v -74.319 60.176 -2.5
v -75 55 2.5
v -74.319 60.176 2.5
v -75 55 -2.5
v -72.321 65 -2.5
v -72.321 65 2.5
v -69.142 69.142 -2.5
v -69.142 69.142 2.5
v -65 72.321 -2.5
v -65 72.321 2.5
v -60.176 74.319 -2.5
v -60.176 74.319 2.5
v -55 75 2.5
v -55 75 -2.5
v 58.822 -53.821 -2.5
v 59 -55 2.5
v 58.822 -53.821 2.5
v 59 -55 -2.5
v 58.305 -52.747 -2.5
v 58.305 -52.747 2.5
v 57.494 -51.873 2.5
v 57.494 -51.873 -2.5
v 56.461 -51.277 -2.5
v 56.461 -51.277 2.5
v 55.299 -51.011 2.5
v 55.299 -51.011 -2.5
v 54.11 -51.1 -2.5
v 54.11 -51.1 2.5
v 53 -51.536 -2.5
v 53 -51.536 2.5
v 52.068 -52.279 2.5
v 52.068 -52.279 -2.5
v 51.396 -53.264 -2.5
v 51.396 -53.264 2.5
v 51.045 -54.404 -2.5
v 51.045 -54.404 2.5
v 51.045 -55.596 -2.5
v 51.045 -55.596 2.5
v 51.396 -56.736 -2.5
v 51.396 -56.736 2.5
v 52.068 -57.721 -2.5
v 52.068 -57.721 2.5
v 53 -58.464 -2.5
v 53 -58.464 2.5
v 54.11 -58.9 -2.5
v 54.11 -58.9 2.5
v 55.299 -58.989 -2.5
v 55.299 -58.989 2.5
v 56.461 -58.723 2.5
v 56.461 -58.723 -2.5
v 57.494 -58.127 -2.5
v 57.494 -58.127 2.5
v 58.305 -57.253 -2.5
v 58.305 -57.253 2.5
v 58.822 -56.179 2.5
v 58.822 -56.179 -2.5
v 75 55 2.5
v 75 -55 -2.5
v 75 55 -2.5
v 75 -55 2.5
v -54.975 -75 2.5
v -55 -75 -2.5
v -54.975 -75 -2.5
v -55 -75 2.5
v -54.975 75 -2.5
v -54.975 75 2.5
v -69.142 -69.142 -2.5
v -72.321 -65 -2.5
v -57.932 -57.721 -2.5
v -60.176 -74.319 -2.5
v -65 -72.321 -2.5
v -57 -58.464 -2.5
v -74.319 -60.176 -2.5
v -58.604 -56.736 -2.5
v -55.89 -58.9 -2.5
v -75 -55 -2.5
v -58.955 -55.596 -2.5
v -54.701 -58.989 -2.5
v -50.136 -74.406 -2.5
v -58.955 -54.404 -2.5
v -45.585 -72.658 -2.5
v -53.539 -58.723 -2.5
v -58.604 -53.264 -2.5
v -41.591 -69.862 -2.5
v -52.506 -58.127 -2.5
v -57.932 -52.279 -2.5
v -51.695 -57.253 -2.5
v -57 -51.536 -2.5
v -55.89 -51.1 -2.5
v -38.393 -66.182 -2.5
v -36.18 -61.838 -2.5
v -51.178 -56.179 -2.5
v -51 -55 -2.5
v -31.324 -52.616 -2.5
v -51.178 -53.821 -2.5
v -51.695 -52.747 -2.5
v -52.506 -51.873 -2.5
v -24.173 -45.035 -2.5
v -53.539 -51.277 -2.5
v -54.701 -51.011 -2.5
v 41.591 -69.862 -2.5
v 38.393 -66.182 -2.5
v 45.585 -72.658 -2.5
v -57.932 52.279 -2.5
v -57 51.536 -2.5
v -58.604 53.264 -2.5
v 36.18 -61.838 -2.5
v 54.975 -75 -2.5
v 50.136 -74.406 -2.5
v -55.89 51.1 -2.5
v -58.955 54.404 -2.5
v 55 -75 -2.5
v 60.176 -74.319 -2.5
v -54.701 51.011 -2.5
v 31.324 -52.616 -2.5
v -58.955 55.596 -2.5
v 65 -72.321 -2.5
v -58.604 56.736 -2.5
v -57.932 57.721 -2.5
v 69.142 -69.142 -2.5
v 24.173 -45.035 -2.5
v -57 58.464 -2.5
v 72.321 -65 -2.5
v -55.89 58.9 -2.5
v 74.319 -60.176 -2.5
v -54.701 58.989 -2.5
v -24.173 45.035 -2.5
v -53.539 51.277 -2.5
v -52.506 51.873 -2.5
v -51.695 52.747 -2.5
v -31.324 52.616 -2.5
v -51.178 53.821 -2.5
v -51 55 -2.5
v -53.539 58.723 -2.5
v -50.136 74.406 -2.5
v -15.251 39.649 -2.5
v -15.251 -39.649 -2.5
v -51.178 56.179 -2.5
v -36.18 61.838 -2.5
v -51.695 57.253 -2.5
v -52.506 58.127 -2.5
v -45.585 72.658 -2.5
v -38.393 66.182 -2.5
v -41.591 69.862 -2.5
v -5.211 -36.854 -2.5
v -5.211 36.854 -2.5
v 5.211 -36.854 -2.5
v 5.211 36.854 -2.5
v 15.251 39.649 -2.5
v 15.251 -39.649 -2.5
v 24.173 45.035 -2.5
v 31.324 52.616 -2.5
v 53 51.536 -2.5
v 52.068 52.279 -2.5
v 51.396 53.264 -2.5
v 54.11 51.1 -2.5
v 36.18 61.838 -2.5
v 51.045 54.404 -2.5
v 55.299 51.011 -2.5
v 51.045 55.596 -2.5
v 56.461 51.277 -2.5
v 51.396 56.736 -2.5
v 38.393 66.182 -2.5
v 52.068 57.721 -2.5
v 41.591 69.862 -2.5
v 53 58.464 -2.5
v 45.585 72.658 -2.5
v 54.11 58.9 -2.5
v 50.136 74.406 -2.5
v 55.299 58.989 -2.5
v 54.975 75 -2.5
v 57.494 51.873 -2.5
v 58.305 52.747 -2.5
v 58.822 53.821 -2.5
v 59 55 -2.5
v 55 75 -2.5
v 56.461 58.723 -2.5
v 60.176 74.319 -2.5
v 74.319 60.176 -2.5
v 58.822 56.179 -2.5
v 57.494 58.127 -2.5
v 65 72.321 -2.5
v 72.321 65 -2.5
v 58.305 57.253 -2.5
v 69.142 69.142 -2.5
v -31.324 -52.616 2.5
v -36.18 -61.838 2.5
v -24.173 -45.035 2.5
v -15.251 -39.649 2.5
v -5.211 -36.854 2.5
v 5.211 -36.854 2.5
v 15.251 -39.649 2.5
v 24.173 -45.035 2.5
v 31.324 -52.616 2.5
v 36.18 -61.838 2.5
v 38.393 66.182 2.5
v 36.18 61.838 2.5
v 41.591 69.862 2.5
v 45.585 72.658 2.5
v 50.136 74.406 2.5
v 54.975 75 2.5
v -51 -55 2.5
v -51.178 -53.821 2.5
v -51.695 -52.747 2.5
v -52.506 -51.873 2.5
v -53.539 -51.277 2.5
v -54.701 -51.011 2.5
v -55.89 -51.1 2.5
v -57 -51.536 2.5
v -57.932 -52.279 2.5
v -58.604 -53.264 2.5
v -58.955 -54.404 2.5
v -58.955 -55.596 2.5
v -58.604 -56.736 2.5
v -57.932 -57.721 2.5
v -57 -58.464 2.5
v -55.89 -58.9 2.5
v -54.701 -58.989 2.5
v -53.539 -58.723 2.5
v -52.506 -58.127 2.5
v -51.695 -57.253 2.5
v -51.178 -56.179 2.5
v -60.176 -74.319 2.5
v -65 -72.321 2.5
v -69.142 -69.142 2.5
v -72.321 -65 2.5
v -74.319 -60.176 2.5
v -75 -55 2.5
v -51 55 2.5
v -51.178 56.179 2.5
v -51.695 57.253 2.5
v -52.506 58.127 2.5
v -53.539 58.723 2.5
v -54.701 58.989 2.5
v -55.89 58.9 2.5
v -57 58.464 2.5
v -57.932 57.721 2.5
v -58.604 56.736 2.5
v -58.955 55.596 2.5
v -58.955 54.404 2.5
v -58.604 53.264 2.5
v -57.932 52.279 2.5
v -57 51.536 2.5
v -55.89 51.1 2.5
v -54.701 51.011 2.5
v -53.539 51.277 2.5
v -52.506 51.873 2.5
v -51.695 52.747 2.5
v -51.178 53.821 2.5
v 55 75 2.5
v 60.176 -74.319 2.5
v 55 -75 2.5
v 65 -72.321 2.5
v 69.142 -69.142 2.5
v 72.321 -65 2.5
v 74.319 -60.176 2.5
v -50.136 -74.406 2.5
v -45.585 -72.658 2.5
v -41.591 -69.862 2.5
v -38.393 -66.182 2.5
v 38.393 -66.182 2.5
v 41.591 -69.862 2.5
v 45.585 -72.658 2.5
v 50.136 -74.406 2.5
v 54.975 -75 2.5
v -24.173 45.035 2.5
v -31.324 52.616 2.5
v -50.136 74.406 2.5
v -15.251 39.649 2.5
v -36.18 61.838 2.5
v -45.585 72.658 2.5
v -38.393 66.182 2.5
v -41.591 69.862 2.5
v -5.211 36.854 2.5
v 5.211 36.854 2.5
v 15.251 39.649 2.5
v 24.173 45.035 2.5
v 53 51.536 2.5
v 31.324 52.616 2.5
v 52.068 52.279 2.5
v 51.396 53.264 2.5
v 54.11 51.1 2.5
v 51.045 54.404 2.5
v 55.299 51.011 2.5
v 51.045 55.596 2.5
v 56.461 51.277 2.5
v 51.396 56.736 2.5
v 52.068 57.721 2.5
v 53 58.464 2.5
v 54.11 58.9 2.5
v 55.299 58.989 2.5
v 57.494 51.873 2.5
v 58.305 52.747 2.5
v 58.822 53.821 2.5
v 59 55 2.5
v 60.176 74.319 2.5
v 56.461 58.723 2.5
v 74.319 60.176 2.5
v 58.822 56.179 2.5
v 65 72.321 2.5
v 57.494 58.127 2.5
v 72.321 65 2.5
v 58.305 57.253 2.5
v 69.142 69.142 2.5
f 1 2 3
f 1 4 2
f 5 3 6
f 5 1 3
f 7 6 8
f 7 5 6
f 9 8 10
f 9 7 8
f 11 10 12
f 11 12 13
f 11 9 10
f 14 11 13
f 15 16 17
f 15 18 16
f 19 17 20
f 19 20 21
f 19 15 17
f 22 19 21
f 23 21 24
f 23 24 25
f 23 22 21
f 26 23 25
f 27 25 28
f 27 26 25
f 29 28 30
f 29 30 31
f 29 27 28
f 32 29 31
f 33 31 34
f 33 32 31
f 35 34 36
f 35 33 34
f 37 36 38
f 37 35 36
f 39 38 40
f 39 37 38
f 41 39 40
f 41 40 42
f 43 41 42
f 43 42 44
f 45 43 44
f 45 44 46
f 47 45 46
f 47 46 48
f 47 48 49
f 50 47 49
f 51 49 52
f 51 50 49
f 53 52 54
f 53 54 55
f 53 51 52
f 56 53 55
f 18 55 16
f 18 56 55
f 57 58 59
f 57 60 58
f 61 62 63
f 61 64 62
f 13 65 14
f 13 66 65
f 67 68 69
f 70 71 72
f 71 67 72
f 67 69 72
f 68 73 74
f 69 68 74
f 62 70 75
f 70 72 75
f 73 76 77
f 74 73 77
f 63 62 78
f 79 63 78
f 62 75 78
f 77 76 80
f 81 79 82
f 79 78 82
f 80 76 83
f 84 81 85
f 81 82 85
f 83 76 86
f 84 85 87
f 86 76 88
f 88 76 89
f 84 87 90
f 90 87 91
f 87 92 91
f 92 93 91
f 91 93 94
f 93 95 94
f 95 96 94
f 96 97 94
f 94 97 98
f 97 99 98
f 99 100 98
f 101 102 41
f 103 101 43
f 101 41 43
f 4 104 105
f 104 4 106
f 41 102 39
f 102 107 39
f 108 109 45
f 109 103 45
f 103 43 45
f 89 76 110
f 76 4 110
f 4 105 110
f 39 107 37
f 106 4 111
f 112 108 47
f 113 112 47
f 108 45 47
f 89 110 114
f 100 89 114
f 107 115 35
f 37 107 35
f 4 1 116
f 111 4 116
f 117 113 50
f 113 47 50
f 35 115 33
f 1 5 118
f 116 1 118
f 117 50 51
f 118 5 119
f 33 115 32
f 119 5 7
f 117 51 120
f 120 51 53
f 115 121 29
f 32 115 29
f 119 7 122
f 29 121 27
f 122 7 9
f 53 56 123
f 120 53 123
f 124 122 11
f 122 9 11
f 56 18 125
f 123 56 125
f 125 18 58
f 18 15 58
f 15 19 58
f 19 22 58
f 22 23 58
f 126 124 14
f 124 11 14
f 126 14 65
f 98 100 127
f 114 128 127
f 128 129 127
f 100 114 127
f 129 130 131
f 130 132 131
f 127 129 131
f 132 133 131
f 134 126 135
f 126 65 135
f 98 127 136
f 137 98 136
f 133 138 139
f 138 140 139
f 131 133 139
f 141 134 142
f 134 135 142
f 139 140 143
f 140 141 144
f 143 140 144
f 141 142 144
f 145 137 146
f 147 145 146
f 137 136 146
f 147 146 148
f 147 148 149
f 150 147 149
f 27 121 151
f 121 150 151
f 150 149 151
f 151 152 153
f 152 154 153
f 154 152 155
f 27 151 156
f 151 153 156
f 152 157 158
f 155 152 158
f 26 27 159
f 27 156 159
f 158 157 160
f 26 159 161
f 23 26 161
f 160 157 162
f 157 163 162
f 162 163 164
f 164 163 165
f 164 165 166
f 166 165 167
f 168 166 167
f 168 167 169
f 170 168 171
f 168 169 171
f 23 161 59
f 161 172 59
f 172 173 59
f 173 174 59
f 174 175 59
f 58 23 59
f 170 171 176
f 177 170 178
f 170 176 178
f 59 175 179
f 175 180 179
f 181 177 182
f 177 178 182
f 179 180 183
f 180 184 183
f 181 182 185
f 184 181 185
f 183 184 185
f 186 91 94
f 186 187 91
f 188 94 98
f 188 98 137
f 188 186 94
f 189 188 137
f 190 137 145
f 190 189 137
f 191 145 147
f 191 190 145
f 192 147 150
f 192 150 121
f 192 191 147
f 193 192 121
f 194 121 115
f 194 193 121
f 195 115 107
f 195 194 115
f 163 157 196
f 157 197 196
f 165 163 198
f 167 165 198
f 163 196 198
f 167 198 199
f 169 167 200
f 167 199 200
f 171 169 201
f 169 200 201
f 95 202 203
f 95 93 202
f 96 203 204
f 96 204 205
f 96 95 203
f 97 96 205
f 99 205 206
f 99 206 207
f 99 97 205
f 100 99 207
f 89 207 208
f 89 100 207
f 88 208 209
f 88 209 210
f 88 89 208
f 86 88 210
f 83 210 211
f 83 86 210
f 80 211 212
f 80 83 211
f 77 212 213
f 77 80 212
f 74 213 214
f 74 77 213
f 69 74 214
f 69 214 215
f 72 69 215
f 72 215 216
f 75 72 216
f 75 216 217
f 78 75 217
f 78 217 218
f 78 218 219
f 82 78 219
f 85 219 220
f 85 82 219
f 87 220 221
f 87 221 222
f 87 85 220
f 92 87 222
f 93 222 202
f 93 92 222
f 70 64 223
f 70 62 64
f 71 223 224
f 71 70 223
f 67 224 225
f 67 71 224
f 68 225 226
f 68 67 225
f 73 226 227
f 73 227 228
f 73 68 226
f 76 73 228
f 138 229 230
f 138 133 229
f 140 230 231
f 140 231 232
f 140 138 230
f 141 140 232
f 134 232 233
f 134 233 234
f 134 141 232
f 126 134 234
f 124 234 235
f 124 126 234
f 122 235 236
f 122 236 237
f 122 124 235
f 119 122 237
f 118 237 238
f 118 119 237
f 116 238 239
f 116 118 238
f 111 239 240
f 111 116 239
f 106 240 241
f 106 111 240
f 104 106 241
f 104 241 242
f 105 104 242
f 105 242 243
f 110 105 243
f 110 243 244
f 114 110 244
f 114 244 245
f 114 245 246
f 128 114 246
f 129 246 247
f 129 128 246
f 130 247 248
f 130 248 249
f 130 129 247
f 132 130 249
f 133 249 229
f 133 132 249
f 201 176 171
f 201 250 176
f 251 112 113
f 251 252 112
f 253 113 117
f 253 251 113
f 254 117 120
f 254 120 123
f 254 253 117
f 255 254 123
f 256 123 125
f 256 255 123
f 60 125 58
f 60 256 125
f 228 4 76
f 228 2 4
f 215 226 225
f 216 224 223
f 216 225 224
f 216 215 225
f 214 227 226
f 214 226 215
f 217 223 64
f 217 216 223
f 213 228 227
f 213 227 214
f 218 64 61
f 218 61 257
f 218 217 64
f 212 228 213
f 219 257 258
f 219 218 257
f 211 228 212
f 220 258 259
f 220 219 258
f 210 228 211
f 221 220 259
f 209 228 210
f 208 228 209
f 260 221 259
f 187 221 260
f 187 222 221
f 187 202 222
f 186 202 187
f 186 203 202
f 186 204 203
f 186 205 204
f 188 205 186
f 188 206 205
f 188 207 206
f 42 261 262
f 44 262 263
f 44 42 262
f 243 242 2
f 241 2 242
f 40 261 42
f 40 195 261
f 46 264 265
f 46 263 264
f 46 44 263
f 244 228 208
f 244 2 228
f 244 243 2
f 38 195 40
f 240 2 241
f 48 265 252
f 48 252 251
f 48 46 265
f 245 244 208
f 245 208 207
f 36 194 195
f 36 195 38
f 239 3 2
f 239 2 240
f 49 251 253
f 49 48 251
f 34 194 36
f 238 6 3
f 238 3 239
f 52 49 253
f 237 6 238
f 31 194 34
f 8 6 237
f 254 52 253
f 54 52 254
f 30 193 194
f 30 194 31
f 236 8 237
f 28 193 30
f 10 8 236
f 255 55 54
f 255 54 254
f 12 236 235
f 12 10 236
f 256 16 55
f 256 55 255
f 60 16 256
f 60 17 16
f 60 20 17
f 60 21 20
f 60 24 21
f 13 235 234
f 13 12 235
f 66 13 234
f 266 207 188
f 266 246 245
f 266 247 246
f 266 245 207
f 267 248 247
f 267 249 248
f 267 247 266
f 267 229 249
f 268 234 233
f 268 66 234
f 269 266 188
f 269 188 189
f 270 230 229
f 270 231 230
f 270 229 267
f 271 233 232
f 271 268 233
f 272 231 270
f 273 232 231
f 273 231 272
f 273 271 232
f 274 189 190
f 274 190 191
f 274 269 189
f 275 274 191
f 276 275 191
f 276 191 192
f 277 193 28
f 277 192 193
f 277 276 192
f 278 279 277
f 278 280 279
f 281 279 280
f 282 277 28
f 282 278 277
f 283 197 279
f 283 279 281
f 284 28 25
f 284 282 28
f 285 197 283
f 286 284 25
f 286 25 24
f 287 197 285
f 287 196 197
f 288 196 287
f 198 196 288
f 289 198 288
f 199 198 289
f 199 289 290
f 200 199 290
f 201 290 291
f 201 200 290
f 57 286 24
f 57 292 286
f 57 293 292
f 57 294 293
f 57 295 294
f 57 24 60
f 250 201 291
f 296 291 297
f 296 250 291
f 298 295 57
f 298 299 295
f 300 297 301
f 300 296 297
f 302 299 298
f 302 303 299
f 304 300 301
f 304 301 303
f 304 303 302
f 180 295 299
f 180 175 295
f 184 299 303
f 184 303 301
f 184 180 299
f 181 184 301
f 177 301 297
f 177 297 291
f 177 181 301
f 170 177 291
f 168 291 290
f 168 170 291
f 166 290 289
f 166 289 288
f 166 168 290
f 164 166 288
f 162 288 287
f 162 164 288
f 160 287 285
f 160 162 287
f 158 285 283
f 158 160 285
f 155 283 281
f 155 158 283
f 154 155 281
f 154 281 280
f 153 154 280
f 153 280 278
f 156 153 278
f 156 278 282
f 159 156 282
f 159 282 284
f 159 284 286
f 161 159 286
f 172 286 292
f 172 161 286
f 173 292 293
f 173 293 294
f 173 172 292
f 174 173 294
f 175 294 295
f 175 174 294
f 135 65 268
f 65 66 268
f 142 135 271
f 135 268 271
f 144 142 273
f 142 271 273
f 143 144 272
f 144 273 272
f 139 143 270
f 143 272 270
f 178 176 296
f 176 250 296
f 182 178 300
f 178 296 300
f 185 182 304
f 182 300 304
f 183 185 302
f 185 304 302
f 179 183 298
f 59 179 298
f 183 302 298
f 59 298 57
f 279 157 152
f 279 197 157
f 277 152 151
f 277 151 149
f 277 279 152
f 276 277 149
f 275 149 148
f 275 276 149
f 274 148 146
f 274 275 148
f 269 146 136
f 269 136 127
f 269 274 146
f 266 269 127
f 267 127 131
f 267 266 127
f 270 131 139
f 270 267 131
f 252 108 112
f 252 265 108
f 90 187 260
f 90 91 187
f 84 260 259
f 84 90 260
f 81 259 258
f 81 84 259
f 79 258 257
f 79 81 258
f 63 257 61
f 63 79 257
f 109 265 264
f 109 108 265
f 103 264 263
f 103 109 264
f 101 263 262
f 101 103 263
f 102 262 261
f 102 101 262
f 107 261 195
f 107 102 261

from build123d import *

# Parameters (mm, degrees)
F0_R     = 4
F1_DEPTH = 2.5
F2_R     = 20


with BuildPart() as f1:
    # F0 (on Top) → F1 (new body, symmetric)
    with BuildSketch(Plane.XY):
        with BuildLine():
            Line((38.5, -75), (75, -75))
            Line((75, -75), (75, 75))
            Line((75, 75), (38.5, 75))
            ThreePointArc((38.5, 75), (0, 36.5), (-38.5, 75))
            Line((-38.5, 75), (-75, 75))
            Line((-75, 75), (-75, -75))
            Line((-75, -75), (-38.5, -75))
            ThreePointArc((-38.5, -75), (0, -36.5), (38.5, -75))
        make_face()
        with Locations((-55, -55)):
            Circle(F0_R, mode=Mode.SUBTRACT)
        with Locations((55, -55)):
            Circle(F0_R, mode=Mode.SUBTRACT)
        with Locations((-55, 55)):
            Circle(F0_R, mode=Mode.SUBTRACT)
        with Locations((55, 55)):
            Circle(F0_R, mode=Mode.SUBTRACT)
    extrude(amount=F1_DEPTH, both=True)

    # F2
    f2_edges = [f1.edges().sort_by_distance(p)[0] for p in [
        (75, -75, 0),
        (75, 75, 0),
        (-75, 75, 0),
        (-38.5, 75, 0),
        (38.5, 75, 0),
        (-38.5, -75, 0),
        (38.5, -75, 0),
        (-75, -75, 0),
    ]]
    fillet(f2_edges, radius=F2_R)


solid = f1.part
